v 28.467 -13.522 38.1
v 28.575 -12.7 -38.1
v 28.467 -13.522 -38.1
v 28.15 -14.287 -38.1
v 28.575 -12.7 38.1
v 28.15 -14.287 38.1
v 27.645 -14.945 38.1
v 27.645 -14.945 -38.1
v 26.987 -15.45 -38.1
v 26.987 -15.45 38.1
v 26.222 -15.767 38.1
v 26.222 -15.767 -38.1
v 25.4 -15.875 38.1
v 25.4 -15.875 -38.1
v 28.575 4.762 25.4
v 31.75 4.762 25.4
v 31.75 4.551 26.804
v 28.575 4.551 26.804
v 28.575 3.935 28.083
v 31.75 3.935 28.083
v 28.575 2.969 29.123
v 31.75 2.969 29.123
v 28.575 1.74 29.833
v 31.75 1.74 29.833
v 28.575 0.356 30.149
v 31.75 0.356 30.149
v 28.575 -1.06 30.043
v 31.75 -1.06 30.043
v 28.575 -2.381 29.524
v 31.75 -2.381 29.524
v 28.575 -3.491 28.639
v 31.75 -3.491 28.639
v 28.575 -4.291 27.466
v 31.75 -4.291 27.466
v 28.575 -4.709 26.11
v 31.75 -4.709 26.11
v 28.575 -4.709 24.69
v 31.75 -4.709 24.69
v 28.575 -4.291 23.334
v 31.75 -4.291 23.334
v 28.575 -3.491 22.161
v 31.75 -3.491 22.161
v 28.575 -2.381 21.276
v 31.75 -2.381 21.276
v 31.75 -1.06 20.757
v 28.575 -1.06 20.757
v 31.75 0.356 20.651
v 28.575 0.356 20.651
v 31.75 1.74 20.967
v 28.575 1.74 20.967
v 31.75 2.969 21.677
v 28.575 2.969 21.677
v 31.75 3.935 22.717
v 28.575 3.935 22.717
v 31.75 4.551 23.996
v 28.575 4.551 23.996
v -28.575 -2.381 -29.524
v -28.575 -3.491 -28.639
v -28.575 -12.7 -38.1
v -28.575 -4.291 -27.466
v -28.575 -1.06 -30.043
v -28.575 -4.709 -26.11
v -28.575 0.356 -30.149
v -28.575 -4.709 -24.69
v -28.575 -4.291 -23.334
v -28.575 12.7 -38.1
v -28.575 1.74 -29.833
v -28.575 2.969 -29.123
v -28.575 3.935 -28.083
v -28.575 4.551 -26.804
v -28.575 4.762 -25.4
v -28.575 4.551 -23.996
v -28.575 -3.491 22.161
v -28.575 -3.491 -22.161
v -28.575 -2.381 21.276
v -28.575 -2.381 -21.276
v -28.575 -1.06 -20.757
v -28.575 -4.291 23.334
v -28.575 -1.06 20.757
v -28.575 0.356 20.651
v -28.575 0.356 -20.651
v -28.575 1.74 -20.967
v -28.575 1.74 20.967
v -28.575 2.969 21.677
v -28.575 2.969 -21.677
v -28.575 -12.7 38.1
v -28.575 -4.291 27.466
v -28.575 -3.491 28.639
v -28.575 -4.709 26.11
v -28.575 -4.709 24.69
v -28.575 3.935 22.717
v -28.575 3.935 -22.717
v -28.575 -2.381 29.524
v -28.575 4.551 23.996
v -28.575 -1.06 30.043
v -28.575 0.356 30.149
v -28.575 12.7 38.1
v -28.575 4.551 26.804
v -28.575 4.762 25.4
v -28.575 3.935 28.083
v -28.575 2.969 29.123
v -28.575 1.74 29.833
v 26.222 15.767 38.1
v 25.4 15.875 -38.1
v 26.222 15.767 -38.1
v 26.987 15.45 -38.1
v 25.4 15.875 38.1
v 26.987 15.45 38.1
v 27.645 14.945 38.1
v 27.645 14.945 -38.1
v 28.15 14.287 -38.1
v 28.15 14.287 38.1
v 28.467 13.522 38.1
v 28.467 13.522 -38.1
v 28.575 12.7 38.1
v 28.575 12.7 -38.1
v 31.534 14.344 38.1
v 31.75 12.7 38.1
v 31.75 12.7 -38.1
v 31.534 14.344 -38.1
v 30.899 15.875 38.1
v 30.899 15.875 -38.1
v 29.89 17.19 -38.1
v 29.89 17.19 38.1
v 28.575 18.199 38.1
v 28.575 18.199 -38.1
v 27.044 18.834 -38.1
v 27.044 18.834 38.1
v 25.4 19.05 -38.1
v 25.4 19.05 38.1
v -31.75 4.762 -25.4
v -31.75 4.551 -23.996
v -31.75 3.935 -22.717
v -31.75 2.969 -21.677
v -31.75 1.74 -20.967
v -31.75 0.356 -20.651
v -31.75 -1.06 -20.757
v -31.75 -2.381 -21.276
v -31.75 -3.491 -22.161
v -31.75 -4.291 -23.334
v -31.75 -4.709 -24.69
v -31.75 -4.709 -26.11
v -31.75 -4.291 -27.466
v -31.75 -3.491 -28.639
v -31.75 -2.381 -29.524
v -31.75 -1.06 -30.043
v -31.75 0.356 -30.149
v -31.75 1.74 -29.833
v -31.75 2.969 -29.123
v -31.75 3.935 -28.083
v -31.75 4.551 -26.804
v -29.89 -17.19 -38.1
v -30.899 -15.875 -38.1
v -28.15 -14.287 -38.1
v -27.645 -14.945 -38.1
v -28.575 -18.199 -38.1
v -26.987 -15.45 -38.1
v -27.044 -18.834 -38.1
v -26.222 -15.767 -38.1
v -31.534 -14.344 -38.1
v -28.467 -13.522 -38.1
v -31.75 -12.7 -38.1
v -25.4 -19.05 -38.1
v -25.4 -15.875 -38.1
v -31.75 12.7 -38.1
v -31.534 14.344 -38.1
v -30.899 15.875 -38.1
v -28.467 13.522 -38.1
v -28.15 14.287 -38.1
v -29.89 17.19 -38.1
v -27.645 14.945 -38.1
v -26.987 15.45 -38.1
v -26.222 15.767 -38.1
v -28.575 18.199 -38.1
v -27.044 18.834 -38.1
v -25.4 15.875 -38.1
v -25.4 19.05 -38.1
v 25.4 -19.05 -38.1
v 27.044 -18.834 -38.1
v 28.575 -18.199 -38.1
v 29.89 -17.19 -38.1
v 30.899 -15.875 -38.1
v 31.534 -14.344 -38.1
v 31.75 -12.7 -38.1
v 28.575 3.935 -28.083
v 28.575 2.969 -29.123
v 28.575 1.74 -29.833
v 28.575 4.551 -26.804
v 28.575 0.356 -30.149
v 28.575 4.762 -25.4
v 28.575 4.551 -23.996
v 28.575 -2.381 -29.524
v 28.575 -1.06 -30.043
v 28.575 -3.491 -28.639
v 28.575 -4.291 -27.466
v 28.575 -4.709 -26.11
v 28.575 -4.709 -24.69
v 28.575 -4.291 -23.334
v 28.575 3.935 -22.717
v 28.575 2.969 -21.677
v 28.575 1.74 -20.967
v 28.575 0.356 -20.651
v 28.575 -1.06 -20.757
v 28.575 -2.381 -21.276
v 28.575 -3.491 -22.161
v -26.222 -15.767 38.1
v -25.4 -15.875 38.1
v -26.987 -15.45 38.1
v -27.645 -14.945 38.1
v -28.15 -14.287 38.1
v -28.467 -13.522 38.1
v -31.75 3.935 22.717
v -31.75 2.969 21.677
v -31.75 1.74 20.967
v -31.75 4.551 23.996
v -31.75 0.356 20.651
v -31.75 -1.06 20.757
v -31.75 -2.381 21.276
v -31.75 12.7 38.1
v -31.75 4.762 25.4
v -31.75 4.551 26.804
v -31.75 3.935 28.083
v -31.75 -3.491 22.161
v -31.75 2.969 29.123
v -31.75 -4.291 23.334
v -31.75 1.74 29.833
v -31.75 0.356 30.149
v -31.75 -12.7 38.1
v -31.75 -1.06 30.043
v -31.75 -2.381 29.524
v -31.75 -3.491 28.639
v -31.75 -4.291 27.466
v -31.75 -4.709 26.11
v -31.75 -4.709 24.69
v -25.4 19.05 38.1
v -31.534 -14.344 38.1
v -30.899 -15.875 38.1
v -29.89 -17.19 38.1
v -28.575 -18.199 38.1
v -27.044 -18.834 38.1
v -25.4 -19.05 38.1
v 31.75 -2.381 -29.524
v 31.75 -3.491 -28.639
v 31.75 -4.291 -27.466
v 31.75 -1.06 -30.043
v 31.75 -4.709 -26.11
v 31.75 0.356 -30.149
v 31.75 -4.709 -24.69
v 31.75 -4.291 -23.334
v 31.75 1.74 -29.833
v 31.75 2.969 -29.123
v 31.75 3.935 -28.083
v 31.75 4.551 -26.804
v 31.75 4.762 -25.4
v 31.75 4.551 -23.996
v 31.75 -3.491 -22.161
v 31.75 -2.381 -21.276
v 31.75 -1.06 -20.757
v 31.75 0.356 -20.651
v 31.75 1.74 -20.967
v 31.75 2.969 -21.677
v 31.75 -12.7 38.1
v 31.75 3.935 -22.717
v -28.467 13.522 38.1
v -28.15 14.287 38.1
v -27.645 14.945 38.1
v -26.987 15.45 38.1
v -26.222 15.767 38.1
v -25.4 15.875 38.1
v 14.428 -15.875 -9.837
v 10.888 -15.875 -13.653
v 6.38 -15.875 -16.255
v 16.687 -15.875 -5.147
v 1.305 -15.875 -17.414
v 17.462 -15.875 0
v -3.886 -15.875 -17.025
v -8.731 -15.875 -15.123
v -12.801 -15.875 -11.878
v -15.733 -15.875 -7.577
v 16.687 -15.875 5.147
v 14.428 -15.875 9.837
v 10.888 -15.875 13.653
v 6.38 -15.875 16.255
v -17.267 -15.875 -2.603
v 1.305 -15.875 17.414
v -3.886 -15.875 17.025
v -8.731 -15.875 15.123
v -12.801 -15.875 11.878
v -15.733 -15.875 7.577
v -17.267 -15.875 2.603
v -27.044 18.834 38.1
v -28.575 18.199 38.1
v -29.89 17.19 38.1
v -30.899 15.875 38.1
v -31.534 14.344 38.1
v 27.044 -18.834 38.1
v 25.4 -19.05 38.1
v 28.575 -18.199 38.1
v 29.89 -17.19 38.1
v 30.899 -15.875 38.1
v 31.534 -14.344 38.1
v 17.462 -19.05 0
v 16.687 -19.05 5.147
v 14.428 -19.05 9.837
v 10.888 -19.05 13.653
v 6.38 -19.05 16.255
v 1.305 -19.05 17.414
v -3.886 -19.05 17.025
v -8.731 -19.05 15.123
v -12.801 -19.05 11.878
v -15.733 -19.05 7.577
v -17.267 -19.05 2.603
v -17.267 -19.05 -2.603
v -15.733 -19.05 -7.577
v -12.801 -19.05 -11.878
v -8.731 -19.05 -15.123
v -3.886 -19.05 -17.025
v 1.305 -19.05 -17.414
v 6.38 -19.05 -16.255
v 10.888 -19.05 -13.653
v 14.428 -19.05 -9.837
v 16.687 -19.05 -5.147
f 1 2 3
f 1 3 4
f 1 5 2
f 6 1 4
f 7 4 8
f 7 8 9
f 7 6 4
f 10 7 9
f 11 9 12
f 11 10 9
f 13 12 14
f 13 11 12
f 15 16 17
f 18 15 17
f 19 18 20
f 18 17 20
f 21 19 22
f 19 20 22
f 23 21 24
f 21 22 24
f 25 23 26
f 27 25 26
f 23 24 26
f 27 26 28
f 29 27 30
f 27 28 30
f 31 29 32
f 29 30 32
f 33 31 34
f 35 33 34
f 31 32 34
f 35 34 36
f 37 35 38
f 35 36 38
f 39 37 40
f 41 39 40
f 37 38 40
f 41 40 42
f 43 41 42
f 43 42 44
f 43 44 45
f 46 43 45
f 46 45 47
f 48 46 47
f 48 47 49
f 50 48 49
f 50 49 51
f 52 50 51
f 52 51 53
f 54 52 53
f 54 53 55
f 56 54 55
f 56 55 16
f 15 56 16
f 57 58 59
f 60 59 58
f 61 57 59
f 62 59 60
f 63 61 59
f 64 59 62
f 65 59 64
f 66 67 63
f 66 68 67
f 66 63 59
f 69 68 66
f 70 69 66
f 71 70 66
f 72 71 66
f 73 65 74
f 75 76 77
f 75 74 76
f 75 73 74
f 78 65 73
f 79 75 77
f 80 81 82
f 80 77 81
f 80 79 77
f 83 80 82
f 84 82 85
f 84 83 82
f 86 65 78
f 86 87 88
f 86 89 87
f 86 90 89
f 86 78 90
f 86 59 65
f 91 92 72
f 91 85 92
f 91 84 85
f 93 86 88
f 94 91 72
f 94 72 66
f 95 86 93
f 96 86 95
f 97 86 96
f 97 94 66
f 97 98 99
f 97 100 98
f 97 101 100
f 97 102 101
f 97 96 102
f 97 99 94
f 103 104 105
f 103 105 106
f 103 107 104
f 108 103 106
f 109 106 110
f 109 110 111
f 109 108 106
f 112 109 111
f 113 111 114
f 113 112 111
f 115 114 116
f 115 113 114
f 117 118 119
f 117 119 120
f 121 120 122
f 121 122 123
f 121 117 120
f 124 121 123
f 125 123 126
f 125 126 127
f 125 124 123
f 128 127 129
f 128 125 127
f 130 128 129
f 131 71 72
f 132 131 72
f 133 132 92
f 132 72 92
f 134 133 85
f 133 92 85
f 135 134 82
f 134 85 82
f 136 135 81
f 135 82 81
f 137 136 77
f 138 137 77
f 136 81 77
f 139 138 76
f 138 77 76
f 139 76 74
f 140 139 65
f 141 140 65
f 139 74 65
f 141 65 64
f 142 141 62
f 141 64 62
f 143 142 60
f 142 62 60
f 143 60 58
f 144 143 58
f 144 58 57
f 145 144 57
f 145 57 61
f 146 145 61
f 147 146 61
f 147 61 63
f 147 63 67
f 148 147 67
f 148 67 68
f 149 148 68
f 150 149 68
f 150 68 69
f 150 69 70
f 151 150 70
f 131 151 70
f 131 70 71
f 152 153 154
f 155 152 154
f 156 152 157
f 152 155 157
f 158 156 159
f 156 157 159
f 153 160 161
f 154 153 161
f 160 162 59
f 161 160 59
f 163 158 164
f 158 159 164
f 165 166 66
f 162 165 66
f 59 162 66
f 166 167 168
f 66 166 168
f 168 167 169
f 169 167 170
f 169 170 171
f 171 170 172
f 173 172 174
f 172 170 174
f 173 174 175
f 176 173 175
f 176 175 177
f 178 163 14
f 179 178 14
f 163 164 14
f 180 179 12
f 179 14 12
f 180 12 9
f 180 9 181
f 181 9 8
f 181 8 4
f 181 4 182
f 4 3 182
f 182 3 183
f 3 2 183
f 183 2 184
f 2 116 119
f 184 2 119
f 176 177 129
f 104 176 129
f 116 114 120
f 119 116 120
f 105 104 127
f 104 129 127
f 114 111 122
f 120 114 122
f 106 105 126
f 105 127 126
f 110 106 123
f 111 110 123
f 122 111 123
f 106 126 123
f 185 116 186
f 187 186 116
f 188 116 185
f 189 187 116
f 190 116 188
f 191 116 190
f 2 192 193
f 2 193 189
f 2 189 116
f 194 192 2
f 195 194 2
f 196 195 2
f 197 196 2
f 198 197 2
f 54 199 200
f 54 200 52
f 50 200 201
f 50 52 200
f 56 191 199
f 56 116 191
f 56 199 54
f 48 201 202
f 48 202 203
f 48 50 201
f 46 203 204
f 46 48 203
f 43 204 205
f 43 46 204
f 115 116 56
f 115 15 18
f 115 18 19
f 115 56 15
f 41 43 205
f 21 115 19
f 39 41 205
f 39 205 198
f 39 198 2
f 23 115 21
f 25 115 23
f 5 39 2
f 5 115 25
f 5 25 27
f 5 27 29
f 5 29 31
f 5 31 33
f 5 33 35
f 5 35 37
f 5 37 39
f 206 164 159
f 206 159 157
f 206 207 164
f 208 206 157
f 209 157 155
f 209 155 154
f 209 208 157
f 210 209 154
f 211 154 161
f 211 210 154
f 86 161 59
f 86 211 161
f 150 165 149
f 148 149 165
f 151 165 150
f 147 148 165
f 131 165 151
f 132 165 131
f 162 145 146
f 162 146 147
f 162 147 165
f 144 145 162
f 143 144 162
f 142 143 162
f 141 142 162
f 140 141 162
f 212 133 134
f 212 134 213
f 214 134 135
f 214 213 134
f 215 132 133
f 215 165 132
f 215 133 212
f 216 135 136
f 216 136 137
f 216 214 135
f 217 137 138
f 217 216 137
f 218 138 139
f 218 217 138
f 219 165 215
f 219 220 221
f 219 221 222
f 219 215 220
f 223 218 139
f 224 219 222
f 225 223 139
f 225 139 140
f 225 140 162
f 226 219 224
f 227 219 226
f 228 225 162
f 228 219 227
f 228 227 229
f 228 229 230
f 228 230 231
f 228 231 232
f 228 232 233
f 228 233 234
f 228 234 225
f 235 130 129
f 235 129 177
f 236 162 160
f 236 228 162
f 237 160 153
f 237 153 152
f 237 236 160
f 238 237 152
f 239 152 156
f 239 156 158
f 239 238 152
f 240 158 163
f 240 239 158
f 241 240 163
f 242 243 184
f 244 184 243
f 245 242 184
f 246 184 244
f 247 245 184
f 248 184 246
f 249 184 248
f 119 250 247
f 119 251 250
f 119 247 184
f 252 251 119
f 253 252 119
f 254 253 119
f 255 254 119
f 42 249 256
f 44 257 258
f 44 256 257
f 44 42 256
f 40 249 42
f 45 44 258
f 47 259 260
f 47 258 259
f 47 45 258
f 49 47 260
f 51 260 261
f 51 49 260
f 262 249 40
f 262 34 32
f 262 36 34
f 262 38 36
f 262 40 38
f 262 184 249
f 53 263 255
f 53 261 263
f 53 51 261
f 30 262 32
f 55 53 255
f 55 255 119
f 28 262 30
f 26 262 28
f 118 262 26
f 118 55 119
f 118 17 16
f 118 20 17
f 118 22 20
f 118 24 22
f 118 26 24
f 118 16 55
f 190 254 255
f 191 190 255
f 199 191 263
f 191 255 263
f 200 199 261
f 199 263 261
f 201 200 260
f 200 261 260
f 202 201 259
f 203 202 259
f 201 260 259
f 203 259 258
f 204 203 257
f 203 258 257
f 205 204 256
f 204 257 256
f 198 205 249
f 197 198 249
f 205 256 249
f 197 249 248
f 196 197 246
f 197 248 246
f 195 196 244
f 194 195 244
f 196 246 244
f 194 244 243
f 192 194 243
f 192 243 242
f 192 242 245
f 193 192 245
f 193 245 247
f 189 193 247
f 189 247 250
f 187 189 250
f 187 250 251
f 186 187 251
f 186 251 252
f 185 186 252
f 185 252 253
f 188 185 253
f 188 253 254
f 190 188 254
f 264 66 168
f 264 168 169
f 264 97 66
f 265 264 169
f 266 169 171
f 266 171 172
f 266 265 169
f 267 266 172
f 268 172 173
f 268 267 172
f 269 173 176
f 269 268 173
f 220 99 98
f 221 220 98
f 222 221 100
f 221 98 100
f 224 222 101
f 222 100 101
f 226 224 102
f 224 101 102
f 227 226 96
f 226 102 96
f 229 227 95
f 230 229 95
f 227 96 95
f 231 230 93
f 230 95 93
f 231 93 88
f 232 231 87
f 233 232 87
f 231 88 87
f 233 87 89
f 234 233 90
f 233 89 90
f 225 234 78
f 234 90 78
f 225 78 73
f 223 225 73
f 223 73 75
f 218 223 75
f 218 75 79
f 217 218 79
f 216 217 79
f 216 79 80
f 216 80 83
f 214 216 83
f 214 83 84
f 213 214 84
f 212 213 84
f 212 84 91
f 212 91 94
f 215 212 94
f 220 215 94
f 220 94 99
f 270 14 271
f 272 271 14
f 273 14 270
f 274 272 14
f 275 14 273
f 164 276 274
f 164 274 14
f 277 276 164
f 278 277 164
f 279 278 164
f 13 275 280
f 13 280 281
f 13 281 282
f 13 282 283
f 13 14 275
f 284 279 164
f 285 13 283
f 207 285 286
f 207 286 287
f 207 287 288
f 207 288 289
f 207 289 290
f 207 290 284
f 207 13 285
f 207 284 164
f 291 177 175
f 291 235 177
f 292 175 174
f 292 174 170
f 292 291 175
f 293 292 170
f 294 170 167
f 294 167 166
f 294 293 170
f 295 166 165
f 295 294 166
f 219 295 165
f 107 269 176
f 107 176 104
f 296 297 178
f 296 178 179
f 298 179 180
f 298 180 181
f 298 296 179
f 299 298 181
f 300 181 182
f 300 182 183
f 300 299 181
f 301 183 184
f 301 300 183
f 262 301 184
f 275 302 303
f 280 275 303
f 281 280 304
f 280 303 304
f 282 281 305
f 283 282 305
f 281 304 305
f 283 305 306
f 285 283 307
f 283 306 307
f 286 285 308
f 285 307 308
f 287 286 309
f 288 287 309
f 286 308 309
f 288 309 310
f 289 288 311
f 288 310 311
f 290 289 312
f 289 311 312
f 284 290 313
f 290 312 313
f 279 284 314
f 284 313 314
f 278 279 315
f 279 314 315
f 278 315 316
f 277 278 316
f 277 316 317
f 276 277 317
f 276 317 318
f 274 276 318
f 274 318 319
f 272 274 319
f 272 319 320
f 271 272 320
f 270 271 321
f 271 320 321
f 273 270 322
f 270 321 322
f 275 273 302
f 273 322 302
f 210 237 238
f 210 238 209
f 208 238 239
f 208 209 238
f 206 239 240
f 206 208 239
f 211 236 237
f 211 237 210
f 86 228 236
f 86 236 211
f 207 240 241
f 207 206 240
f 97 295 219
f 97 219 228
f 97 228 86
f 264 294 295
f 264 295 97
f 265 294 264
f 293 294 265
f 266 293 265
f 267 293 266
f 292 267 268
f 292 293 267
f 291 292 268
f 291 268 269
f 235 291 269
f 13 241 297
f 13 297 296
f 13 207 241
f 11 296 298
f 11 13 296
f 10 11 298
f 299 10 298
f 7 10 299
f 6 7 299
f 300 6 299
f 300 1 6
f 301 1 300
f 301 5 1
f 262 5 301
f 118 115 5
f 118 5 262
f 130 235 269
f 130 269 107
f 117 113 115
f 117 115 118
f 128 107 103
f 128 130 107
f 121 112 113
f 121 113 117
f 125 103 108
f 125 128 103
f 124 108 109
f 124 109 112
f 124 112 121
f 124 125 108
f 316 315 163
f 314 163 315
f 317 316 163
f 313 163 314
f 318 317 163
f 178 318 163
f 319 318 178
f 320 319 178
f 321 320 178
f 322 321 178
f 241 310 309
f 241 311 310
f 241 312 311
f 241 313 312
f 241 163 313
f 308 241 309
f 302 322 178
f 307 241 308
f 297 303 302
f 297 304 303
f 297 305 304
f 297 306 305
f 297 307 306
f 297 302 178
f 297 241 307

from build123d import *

# Parameters (mm, degrees)
F1_DEPTH = 38.1
F2_R     = 4.7625
F3_DEPTH = 63.501
F4_R     = 17.4625
F5_DEPTH = 3.175


with BuildPart() as f1:
    # F0 (on Top) → F1 (new body, symmetric)
    with BuildSketch(Plane.XY):
        with BuildLine():
            Line((-25.4, -19.05), (25.4, -19.05))
            ThreePointArc((25.4, -19.05), (29.890128, -17.190128), (31.75, -12.7))
            Line((31.75, -12.7), (31.75, 12.7))
            ThreePointArc((31.75, 12.7), (29.890128, 17.190128), (25.4, 19.05))
            Line((25.4, 19.05), (-25.4, 19.05))
            ThreePointArc((-25.4, 19.05), (-29.890128, 17.190128), (-31.75, 12.7))
            Line((-31.75, 12.7), (-31.75, -12.7))
            ThreePointArc((-31.75, -12.7), (-29.890128, -17.190128), (-25.4, -19.05))
        make_face()
        with BuildLine():
            Line((-25.4, 15.875), (25.4, 15.875))
            ThreePointArc((25.4, 15.875), (27.645064, 14.945064), (28.575, 12.7))
            Line((28.575, 12.7), (28.575, -12.7))
            ThreePointArc((28.575, -12.7), (27.645064, -14.945064), (25.4, -15.875))
            Line((25.4, -15.875), (-25.4, -15.875))
            ThreePointArc((-25.4, -15.875), (-27.645064, -14.945064), (-28.575, -12.7))
            Line((-28.575, -12.7), (-28.575, 12.7))
            ThreePointArc((-28.575, 12.7), (-27.645064, 14.945064), (-25.4, 15.875))
        make_face(mode=Mode.SUBTRACT)
    extrude(amount=F1_DEPTH, both=True)

    # F2 (on face) → F3 (cut, through all)
    with BuildSketch(Plane.YZ.offset(31.75)):
        with Locations((0, 25.4)):
            Circle(F2_R)
        with Locations((0, -25.4)):
            Circle(F2_R)
    extrude(amount=-F3_DEPTH, mode=Mode.SUBTRACT)

    # F4 (on face) → F5 (cut, through all)
    with BuildSketch(Plane.XZ.offset(19.05)):
        Circle(F4_R)
    extrude(amount=-F5_DEPTH, mode=Mode.SUBTRACT)


solid = f1.part
